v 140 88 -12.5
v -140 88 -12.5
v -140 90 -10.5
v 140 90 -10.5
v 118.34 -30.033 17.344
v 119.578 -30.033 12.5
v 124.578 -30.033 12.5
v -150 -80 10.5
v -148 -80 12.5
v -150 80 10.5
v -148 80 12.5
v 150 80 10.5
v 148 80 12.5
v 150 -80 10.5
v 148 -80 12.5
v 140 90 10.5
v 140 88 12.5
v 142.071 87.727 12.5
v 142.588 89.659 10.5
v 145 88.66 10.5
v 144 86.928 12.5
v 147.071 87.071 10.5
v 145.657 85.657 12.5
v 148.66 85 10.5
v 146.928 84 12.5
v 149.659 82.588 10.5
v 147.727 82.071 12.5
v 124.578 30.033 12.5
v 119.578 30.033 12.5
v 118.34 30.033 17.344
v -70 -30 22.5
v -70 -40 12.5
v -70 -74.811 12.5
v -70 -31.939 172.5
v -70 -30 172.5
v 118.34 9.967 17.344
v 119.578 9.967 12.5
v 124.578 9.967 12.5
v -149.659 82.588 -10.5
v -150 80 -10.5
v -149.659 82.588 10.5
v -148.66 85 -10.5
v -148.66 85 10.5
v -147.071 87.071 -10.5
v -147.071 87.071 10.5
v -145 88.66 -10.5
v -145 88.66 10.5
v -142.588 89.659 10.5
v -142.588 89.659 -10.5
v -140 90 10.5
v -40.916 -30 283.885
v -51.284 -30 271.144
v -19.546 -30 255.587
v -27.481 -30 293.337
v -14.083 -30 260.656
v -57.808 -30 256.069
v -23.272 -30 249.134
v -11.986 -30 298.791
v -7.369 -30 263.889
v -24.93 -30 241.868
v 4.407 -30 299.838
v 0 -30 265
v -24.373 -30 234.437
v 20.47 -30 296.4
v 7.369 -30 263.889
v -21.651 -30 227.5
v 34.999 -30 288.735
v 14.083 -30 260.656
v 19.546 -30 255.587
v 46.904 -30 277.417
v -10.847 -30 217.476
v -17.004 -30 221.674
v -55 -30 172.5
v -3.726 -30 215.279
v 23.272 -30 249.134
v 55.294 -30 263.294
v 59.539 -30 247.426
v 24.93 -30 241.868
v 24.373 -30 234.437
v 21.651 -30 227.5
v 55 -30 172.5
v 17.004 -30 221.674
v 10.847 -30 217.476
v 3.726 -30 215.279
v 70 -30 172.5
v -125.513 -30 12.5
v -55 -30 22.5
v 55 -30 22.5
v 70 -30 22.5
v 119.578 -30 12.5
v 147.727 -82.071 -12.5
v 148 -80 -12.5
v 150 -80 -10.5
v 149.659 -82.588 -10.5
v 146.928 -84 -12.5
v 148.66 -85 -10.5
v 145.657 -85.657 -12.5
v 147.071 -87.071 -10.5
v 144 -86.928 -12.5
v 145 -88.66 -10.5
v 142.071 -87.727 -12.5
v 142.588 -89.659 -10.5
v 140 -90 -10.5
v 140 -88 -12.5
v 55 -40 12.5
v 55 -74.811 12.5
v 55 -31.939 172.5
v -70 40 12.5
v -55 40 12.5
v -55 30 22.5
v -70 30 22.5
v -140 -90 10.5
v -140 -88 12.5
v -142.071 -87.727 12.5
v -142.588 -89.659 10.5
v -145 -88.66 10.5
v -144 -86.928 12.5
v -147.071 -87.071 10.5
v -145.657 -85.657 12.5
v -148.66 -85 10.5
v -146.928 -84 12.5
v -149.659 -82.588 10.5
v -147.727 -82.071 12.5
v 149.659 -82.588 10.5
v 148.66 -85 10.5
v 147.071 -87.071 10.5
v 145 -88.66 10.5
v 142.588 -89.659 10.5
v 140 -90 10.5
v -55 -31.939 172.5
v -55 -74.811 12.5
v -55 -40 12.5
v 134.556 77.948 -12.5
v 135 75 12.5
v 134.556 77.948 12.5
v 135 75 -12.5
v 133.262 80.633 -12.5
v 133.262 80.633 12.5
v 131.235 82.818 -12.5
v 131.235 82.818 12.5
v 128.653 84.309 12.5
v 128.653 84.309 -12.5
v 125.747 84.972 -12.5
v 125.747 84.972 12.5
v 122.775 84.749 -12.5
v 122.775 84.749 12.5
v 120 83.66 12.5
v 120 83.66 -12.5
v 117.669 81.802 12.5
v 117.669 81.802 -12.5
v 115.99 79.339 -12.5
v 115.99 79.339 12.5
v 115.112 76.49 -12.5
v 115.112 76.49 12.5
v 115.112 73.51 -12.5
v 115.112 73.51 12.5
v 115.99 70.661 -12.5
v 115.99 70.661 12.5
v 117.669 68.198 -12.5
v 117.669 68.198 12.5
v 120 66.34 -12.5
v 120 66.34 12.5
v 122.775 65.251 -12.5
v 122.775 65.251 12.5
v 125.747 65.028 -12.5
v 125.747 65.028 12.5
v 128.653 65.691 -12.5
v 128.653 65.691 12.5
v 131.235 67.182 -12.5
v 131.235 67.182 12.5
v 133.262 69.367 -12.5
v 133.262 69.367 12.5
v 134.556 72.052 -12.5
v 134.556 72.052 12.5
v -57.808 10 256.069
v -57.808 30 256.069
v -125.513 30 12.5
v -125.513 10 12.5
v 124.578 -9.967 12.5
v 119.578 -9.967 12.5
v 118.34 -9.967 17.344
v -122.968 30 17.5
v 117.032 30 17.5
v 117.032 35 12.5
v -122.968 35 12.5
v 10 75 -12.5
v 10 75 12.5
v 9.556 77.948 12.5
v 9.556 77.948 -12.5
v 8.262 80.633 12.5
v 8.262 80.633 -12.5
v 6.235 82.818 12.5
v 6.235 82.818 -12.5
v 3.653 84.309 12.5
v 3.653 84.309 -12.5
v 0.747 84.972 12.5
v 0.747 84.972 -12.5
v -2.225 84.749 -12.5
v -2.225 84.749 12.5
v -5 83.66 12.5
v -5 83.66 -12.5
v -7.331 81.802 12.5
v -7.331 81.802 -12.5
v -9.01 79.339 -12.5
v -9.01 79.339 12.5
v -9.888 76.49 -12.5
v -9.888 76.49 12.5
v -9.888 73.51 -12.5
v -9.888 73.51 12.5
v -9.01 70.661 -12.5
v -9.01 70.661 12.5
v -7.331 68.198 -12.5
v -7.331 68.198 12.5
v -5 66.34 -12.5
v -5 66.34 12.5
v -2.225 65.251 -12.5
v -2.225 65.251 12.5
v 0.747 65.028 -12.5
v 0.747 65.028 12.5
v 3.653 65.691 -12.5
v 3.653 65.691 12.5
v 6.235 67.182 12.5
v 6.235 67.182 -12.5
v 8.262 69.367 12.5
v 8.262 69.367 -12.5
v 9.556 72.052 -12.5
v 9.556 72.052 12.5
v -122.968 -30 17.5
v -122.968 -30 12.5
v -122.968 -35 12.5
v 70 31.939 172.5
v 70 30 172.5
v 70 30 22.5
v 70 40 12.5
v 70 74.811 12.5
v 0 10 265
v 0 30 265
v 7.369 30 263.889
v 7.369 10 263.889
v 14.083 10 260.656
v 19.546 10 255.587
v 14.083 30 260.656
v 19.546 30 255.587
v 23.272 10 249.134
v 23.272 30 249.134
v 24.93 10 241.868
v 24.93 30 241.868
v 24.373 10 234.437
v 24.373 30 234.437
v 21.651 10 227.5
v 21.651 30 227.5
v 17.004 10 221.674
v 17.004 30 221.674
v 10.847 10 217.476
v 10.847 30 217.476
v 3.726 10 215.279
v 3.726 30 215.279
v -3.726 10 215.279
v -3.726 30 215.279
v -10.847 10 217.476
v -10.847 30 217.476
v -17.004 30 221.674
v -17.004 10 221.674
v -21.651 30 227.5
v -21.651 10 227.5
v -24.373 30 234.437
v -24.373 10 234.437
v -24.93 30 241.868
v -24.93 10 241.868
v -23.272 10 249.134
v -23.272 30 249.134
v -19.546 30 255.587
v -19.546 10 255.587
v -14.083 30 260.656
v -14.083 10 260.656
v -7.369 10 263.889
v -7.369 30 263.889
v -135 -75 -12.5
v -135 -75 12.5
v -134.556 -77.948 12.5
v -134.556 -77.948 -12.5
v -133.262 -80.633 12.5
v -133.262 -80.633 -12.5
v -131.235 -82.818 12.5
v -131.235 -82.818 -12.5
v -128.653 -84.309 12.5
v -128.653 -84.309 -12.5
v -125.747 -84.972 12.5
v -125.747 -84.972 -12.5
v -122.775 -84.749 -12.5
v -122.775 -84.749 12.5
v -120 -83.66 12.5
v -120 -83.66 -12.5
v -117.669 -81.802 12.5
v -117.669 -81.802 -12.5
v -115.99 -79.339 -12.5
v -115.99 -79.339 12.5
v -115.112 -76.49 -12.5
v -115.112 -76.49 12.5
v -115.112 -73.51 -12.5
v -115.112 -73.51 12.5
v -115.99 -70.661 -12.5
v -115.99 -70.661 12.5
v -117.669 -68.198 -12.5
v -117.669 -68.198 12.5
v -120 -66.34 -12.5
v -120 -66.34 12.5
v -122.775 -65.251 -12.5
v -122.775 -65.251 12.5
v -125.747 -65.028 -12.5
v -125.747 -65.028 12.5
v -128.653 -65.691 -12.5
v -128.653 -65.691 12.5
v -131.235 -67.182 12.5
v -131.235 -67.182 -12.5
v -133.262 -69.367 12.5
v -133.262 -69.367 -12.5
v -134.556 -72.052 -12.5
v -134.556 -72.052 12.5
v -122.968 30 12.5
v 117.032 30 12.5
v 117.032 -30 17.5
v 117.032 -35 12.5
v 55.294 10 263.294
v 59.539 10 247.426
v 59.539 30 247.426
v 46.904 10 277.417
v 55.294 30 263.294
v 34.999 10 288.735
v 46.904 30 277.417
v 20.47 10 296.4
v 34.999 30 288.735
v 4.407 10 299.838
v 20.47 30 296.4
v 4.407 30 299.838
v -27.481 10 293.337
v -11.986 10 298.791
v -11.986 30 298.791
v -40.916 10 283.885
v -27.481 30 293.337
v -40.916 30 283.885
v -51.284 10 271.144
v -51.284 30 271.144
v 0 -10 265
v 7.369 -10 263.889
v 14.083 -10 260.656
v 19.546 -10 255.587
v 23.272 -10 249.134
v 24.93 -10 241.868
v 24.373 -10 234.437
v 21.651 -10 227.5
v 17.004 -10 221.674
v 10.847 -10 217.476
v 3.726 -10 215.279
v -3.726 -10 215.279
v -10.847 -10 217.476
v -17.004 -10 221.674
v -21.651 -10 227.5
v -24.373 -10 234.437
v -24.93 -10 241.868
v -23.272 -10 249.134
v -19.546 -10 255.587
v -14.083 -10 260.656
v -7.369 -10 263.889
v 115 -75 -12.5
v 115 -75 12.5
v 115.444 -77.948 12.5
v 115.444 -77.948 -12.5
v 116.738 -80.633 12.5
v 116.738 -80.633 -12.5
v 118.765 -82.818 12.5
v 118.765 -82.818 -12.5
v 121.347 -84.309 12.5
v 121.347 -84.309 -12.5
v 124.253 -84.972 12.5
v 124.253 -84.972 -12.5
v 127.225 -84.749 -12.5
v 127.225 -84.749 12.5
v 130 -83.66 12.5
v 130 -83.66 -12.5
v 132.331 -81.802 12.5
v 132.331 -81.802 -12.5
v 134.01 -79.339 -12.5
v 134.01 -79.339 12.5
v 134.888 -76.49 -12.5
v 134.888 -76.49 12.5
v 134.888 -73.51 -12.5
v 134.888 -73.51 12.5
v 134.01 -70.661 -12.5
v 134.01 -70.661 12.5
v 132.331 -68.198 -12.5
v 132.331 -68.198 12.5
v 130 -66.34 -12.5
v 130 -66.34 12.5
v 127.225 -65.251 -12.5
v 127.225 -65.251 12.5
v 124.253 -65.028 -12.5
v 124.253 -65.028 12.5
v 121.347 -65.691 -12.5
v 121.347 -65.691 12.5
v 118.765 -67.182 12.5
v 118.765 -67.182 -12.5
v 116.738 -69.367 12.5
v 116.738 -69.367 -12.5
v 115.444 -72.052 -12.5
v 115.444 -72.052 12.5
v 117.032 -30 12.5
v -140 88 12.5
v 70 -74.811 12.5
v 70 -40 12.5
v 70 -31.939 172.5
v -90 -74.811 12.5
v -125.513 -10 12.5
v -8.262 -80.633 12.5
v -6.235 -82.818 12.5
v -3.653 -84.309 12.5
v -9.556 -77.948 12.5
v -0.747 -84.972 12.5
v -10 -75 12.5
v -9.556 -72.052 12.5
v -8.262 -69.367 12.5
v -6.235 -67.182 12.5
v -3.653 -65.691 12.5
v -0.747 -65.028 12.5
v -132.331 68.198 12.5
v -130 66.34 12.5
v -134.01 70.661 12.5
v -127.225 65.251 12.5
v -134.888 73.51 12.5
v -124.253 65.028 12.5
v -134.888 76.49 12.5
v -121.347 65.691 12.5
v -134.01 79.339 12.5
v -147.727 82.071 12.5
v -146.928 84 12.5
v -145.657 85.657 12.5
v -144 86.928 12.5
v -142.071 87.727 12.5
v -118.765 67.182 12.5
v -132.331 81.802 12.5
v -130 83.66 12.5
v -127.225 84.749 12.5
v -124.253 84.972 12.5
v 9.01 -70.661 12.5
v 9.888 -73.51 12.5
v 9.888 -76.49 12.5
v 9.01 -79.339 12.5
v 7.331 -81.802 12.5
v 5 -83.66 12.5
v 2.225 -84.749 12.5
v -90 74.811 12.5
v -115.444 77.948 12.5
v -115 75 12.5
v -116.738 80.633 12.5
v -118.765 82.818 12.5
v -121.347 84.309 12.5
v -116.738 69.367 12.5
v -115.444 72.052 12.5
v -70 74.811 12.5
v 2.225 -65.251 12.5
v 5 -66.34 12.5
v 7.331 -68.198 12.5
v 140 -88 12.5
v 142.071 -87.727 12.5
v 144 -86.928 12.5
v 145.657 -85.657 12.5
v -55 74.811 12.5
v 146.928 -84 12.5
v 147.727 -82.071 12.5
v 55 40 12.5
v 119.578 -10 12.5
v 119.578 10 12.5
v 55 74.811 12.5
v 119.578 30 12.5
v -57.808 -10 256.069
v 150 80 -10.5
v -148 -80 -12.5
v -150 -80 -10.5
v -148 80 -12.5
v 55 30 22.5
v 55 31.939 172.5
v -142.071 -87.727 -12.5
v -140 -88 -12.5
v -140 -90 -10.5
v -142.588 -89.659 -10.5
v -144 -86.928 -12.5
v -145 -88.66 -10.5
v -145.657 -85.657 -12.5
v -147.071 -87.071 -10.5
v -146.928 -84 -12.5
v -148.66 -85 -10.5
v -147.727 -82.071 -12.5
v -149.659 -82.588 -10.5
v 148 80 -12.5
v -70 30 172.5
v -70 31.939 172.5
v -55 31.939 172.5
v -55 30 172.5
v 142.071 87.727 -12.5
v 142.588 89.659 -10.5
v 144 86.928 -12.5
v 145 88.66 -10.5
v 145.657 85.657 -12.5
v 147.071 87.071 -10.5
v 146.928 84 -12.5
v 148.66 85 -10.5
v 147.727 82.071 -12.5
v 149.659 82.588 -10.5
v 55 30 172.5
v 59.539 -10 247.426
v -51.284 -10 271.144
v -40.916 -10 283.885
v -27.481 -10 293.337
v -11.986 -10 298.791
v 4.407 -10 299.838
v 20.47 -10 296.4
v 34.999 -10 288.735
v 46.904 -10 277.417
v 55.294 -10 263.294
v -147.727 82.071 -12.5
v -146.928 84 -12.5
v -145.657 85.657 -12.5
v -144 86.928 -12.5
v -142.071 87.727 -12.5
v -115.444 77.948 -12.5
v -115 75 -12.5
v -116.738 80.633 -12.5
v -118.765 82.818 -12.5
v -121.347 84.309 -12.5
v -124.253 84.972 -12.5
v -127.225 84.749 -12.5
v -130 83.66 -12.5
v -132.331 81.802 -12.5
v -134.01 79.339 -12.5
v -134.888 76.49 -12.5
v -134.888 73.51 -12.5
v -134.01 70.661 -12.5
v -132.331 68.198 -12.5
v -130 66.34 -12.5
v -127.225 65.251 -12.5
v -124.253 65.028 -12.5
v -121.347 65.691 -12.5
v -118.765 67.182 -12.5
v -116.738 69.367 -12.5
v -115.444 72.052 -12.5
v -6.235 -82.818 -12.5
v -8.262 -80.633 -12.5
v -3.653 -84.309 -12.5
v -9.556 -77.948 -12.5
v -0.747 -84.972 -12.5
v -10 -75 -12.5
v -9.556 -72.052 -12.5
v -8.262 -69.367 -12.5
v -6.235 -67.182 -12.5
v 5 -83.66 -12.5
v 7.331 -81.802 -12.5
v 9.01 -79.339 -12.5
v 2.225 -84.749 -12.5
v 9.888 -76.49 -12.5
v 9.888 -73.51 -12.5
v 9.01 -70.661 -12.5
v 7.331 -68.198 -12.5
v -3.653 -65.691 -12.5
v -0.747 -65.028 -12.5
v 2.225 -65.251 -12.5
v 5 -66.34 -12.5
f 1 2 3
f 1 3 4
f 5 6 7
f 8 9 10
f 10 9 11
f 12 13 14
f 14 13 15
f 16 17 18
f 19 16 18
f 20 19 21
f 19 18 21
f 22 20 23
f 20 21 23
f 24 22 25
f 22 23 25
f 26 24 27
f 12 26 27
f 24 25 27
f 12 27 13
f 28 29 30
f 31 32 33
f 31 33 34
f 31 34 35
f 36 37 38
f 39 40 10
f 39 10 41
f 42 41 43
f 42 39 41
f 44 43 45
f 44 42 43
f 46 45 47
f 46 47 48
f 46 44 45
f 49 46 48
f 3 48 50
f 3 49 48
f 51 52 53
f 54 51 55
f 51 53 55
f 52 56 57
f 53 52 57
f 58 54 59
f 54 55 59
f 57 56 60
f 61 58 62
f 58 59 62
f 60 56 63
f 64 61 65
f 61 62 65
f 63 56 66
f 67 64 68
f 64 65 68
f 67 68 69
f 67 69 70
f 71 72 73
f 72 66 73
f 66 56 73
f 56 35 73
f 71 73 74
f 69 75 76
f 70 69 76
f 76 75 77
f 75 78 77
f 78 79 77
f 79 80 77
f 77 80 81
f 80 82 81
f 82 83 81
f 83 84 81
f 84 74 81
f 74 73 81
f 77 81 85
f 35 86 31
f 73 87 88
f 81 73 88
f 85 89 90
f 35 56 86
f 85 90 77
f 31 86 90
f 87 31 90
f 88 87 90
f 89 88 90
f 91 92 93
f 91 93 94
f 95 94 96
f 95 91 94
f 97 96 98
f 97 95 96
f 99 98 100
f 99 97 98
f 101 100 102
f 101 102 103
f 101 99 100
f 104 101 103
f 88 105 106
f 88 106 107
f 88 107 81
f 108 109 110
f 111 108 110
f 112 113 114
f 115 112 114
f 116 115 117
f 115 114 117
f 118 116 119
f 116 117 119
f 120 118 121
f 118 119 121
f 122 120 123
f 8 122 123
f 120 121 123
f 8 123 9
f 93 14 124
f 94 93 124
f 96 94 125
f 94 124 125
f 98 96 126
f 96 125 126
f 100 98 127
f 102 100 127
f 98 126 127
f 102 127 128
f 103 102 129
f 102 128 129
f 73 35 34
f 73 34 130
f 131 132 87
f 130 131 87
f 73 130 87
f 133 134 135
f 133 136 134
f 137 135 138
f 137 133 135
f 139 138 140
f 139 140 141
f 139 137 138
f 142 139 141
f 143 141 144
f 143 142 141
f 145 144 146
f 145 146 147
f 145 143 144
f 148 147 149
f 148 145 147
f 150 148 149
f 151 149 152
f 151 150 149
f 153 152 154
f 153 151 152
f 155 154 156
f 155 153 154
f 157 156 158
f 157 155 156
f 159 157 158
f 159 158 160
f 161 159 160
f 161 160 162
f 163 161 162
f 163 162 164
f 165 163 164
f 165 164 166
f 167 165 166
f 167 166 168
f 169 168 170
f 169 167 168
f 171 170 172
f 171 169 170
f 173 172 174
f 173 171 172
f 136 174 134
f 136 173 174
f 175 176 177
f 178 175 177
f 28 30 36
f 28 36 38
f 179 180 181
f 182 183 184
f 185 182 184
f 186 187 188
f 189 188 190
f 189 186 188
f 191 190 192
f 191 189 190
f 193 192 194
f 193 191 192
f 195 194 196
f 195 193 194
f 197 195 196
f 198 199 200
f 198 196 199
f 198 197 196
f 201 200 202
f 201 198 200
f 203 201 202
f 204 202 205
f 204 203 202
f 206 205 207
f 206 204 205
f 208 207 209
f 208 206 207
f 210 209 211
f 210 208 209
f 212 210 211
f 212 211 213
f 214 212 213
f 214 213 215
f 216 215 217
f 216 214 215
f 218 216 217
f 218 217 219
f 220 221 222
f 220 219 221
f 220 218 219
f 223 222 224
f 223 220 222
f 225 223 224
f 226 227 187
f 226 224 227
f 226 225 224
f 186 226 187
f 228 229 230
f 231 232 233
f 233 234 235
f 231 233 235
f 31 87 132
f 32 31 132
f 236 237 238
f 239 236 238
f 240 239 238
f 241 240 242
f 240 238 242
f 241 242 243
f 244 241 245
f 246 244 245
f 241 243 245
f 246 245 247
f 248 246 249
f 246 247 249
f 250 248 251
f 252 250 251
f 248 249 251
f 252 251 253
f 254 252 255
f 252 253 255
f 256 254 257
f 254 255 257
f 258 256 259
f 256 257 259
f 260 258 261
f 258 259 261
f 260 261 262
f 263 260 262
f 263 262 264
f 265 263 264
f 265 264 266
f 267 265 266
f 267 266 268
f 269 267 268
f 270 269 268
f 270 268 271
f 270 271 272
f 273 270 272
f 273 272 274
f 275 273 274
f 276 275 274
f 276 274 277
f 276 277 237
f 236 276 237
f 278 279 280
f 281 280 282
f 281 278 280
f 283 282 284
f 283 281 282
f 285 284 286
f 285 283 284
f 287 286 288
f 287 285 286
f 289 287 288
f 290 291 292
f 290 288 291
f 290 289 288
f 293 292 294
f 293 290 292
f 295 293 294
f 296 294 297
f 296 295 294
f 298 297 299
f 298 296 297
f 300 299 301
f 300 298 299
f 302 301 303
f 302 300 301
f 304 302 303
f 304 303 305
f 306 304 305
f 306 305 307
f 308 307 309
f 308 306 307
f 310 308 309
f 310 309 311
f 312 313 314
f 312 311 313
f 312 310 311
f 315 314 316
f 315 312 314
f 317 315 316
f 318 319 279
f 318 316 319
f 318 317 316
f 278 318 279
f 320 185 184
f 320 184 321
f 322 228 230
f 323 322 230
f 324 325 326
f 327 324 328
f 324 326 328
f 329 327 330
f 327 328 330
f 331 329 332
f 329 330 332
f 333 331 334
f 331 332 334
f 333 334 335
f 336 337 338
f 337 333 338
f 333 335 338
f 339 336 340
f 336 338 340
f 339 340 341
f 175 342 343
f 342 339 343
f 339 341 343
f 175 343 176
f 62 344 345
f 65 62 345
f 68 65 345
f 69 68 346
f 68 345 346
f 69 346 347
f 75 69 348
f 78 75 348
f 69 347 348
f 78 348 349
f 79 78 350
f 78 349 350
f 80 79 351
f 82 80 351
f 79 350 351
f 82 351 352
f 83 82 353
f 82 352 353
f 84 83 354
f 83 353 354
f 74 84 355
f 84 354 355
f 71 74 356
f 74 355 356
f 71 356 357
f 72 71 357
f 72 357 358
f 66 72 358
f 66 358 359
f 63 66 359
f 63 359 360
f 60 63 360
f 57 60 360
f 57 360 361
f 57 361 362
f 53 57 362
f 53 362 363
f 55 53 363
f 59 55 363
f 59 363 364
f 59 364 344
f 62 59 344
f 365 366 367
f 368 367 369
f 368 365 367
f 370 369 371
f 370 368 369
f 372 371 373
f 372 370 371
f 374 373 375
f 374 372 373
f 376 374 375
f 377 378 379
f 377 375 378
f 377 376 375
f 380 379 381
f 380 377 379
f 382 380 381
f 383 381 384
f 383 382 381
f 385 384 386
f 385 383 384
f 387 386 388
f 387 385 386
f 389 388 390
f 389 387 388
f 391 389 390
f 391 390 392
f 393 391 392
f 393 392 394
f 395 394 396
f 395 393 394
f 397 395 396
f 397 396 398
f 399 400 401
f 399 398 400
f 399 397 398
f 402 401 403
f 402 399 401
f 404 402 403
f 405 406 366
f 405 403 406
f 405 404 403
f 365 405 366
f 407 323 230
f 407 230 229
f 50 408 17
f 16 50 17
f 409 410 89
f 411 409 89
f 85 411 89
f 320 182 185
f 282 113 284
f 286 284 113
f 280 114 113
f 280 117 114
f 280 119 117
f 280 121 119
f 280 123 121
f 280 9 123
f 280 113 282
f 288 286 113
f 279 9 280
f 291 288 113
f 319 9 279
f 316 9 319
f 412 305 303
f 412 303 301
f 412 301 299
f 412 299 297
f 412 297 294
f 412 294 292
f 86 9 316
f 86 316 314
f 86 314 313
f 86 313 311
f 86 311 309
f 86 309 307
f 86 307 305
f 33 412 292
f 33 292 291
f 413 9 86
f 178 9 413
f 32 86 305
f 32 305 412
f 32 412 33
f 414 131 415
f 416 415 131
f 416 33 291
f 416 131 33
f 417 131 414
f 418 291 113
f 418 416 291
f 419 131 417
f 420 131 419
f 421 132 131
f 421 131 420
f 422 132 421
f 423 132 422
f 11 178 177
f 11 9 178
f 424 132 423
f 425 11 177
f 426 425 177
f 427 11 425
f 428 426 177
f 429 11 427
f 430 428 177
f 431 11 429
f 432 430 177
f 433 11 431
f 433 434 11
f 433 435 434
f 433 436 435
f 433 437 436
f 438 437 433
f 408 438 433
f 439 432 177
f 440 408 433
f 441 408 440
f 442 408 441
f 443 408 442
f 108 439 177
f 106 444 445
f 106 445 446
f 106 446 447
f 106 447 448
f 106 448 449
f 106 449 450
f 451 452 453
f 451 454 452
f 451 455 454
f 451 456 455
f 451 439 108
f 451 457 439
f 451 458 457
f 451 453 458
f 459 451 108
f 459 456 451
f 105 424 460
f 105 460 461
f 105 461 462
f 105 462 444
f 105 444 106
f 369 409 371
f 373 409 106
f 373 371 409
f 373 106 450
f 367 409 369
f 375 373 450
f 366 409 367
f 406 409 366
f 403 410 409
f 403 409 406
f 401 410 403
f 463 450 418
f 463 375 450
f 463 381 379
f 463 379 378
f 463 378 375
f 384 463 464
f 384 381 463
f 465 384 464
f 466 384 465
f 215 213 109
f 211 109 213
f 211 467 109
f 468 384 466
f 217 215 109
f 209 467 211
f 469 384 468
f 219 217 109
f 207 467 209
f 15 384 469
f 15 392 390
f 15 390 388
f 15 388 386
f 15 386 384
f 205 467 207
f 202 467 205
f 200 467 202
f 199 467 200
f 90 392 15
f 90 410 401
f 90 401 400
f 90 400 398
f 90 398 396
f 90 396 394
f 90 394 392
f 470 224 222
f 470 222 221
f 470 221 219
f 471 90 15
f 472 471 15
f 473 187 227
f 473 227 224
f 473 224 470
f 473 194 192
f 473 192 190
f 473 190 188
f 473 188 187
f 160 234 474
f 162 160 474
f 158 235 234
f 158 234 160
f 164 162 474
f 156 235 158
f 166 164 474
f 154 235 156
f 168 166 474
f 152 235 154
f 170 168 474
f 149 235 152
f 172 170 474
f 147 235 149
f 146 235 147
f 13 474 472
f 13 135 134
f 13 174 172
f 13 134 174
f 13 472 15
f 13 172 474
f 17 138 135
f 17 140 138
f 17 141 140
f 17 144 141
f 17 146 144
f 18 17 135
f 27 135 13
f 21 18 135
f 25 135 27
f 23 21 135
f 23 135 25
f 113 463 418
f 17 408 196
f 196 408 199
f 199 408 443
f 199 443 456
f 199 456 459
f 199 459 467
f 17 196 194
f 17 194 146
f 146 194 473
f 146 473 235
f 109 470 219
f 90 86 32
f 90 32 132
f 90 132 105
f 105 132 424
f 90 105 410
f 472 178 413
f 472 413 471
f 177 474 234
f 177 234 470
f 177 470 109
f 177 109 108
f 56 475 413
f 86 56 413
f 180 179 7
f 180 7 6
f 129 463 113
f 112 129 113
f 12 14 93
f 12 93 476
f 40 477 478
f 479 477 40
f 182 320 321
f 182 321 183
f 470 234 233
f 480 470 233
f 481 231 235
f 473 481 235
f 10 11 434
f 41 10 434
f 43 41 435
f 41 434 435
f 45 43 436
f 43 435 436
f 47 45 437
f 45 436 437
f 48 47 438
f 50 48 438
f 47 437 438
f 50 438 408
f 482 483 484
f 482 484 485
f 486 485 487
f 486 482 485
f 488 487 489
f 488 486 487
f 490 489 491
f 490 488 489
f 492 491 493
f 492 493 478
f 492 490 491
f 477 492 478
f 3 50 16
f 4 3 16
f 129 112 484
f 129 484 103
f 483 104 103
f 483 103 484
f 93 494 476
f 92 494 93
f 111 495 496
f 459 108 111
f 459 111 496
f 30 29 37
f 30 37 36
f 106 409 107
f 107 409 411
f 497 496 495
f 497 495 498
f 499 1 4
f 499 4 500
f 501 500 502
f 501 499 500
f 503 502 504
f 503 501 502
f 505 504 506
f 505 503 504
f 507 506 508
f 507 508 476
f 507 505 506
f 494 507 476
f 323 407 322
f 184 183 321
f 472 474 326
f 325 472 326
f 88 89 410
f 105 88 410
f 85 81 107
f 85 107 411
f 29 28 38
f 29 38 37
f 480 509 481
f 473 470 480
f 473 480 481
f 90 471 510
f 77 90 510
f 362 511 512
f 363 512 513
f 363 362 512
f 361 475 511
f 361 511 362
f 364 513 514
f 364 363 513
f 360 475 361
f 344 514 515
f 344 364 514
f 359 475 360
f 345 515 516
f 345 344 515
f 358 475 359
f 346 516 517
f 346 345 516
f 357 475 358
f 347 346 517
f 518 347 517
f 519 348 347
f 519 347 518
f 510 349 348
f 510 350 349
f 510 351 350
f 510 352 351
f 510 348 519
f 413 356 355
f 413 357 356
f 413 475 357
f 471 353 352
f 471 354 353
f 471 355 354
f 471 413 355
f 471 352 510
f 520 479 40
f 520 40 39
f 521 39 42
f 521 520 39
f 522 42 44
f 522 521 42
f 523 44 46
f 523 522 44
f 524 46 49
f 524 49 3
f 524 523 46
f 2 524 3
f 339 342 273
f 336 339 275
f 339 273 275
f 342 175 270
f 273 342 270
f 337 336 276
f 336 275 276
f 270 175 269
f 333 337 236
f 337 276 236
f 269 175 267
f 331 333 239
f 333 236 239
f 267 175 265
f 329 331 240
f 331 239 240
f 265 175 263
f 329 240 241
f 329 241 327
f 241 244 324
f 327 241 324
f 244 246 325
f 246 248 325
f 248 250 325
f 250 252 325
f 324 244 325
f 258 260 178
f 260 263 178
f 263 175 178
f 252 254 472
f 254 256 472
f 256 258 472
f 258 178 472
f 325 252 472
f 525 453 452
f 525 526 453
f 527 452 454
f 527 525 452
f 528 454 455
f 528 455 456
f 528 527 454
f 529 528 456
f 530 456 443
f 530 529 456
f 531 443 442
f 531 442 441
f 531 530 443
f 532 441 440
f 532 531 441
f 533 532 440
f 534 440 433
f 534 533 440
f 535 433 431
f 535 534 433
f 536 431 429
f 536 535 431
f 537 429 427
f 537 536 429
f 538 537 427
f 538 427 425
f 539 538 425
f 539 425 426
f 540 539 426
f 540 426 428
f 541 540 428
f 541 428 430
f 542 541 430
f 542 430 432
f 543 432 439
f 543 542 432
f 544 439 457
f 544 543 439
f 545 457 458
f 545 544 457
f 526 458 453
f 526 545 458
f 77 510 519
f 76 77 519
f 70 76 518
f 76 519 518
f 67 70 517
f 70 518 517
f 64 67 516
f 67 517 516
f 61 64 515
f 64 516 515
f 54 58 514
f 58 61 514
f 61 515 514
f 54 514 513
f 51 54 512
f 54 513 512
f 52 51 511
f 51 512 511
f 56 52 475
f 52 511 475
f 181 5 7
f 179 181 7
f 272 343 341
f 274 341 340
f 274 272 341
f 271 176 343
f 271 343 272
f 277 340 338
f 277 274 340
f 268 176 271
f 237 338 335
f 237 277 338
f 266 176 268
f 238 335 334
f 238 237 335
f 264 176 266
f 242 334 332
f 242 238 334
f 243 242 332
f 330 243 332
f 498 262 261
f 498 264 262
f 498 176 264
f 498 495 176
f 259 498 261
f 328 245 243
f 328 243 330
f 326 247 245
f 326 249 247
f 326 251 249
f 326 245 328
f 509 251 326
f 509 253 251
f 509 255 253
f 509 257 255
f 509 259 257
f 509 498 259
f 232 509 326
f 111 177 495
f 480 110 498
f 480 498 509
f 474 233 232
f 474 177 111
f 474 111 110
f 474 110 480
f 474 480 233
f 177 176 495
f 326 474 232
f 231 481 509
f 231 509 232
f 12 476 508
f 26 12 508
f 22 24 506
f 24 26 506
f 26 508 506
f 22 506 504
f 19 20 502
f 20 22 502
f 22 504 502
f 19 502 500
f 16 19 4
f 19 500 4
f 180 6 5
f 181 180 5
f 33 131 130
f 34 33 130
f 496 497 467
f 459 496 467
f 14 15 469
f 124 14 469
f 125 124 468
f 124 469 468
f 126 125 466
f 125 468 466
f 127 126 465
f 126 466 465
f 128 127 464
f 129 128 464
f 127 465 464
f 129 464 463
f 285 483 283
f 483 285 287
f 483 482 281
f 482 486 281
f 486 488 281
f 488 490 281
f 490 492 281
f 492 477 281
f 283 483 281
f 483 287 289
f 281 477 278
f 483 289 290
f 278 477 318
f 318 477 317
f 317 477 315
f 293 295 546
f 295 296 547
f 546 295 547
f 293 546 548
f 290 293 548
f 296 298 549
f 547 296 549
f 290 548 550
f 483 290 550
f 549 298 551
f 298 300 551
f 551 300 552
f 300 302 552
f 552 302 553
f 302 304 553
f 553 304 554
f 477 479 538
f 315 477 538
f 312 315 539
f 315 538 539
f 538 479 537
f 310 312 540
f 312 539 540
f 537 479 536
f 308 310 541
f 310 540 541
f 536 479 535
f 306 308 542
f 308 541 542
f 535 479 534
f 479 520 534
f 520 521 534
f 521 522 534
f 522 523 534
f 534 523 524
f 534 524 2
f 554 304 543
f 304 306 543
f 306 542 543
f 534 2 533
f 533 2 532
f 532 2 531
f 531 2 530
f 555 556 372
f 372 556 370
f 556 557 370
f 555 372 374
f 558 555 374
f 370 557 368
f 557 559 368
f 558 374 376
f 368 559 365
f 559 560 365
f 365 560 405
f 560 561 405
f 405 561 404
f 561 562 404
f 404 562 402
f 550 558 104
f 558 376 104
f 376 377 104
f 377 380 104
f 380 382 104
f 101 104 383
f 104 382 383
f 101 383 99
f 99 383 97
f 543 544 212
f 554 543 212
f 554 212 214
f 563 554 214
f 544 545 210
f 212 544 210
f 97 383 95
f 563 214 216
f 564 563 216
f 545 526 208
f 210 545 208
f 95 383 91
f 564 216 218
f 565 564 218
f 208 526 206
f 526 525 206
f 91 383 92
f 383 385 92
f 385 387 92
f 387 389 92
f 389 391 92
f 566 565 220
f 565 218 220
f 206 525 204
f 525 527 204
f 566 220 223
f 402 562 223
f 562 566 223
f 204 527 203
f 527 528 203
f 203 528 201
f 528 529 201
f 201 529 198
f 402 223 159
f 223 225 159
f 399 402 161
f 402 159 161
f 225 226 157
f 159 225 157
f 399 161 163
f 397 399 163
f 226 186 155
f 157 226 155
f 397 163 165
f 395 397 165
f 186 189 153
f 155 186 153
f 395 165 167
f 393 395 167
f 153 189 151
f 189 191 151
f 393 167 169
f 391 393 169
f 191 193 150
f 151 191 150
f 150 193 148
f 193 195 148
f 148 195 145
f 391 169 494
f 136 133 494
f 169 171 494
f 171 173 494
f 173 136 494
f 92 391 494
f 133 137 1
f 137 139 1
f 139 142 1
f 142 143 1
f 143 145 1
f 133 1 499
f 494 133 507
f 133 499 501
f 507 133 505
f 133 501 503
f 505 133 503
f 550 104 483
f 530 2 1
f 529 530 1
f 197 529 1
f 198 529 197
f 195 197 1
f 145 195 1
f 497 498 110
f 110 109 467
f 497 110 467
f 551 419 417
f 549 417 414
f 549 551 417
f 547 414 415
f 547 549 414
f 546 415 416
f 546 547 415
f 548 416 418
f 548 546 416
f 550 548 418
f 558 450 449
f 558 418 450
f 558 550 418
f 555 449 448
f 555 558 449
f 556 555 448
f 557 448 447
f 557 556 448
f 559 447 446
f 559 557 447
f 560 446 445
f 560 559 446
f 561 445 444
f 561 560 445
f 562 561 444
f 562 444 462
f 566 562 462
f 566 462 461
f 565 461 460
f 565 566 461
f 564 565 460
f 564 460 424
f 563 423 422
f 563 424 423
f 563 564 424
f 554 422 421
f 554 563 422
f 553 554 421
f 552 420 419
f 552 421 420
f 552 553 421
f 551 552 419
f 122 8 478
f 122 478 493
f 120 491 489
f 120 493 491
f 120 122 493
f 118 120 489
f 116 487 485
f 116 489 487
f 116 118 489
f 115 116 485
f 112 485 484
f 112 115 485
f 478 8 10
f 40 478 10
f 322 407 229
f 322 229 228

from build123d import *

# Parameters (mm, degrees)
SKETCH2_W           = 300
SKETCH2_H           = 180
SKETCH2_R           = 10
BOSS_EXTRUDE1_DEPTH = 12.5
FILLET1_R           = 10
CHAMFER3_SIZE       = 2
SKETCH3_W           = 245.602376855
SKETCH3_H           = 20
BOSS_EXTRUDE2_DEPTH = 290
SKETCH4_R           = 25
CUT_EXTRUDE2_DEPTH  = 290
SKETCH5_W           = 15
SKETCH5_H           = 44.810981007
BOSS_EXTRUDE3_DEPTH = 160
CUT_EXTRUDE4_DEPTH  = 160
CUT_EXTRUDE5_DEPTH  = 160
GUSSET4_START       = 9.967
GUSSET4_DEPTH       = 20.066
GUSSET5_START       = -30.033
GUSSET5_DEPTH       = 20.066
GUSSET6_THICKNESS   = 240
GUSSET7_THICKNESS   = 240


# Read off the part's stored shape, not the designer's step: Gusset4, Gusset5
with BuildPart() as part:
    # Sketch2 → Boss-Extrude1 (new, symmetric)
    with BuildSketch(Plane.XY):
        Rectangle(SKETCH2_W, SKETCH2_H)
        with Locations((125, 75)):
            Circle(SKETCH2_R, mode=Mode.SUBTRACT)
        with Locations((-125, 75)):
            Circle(SKETCH2_R, mode=Mode.SUBTRACT)
        with Locations((0, 75)):
            Circle(SKETCH2_R, mode=Mode.SUBTRACT)
        with Locations(Location((125, -75, 0), (0, 0, 180))):
            Circle(SKETCH2_R, mode=Mode.SUBTRACT)
        with Locations(Location((0, -75, 0), (0, 0, 180))):
            Circle(SKETCH2_R, mode=Mode.SUBTRACT)
        with Locations(Location((-125, -75, 0), (0, 0, 180))):
            Circle(SKETCH2_R, mode=Mode.SUBTRACT)
    extrude(amount=BOSS_EXTRUDE1_DEPTH, both=True)

    # Fillet1
    fillet1_edges = [part.edges().sort_by_distance(p)[0] for p in [
        (-150, 90, 0),
        (150, 90, 0),
        (150, -90, 0),
        (-150, -90, 0),
    ]]
    fillet(fillet1_edges, radius=FILLET1_R)

    # Chamfer3
    chamfer3_edges = [part.edges().sort_by_distance(p)[0] for p in [
        (-150, 0, -12.5),
        (-150, 0, 12.5),
        (0, 90, -12.5),
        (150, 0, -12.5),
        (0, -90, -12.5),
        (147.071067812, 87.071067812, -12.5),
        (147.071067812, -87.071067812, -12.5),
        (-147.071067812, -87.071067812, -12.5),
        (-147.071067812, 87.071067812, -12.5),
        (0, 90, 12.5),
        (0, -90, 12.5),
        (150, 0, 12.5),
        (147.071067812, 87.071067812, 12.5),
        (147.071067812, -87.071067812, 12.5),
        (-147.071067812, -87.071067812, 12.5),
        (-147.071067812, 87.071067812, 12.5),
    ]]
    chamfer(chamfer3_edges, length=CHAMFER3_SIZE)

    # Sketch3 → Boss-Extrude2 (add)
    with BuildSketch(Plane.XY.offset(12.5)):
        with Locations((-2.712098758, 20)):
            Rectangle(SKETCH3_W, SKETCH3_H)
        with Locations((-2.712098758, -20)):
            Rectangle(SKETCH3_W, SKETCH3_H)
    extrude(amount=BOSS_EXTRUDE2_DEPTH)

    # Sketch4 → Cut-Extrude2 (cut)
    with BuildSketch(Plane(origin=(0, 30, 0), x_dir=(1, 0, 0), z_dir=(0, 1, 0))):
        with Locations(Location((0, -240, 0), (0, 0, 270))):
            Circle(SKETCH4_R)
        with BuildLine():
            Line((120.08908967, -12.5), (119.577955686, -12.5))
            Line((119.577955686, -12.5), (59.538734687, -247.42556879))
            ThreePointArc((59.538734687, -247.42556879), (4.407482246, -299.837898528), (-57.808194698, -256.068995792))
            Line((-57.808194698, -256.068995792), (-125.513287185, -12.5))
            Line((-125.513287185, -12.5), (-125.513287185, -302.5))
            Line((-125.513287185, -302.5), (120.08908967, -302.5))
            Line((120.08908967, -302.5), (120.08908967, -12.5))
        make_face()
    extrude(amount=-CUT_EXTRUDE2_DEPTH, mode=Mode.SUBTRACT)

    # Sketch5 → Boss-Extrude3 (add)
    with BuildSketch(Plane.XY.offset(12.5)):
        with Locations((-62.5, 52.405490504)):
            Rectangle(SKETCH5_W, SKETCH5_H)
        with Locations((62.5, 52.405490504)):
            Rectangle(SKETCH5_W, SKETCH5_H)
        with Locations((-62.5, -52.405490504)):
            Rectangle(SKETCH5_W, SKETCH5_H)
        with Locations((62.5, -52.405490504)):
            Rectangle(SKETCH5_W, SKETCH5_H)
    extrude(amount=BOSS_EXTRUDE3_DEPTH)

    # Sketch6 → Cut-Extrude4 (cut)
    with BuildSketch(Plane(origin=(70, 0, 0), x_dir=(0, 0, -1), z_dir=(1, 0, 0))):
        Polygon((-172.5, 74.810981007), (-12.5, 74.810981007), (-172.5, 117.749424337), align=None)
        Polygon((-172.5, 74.810981007), (-172.5, 31.939110218), (-12.5, 74.810981007), align=None)
        Polygon((-12.5, -74.810981007), (-172.5, -31.939110218), (-172.5, -117.749424337), align=None)
    extrude(amount=-CUT_EXTRUDE4_DEPTH, mode=Mode.SUBTRACT)

    # Sketch8 → Cut-Extrude5 (cut)
    with BuildSketch(Plane(origin=(70, 0, 0), x_dir=(0, 0, -1), z_dir=(1, 0, 0))):
        Polygon((-12.5, 40), (-22.5, 30), (-12.5, 30), align=None)
        Polygon((-12.5, -40), (-12.5, -30), (-22.5, -30), align=None)
    extrude(amount=-CUT_EXTRUDE5_DEPTH, mode=Mode.SUBTRACT)


with BuildPart() as body_2:
    # Gusset4 outline → Gusset4 (new body)
    with BuildSketch(Plane(origin=(0, 0, 0), x_dir=(1, 0, 0), z_dir=(0, 1, 0)).offset(GUSSET4_START)):
        Polygon((118.339912342, -17.344300639), (124.577955686, -12.5), (119.577955686, -12.5), align=None)
    extrude(amount=GUSSET4_DEPTH)


with BuildPart() as body_3:
    # Gusset5 outline → Gusset5 (new body)
    with BuildSketch(Plane(origin=(0, 0, 0), x_dir=(1, 0, 0), z_dir=(0, 1, 0)).offset(GUSSET5_START)):
        Polygon((118.339912342, -17.344300639), (124.577955686, -12.5), (119.577955686, -12.5), align=None)
    extrude(amount=GUSSET5_DEPTH)


with BuildPart() as body_4:
    # Gusset6: a gusset: a plate 240.0 thick in the corner of two members, its outline drawn in place
    gusset6_outline = Wire([Line((-122.96766575, 30, 12.5), (-122.96766575, 30, 17.5)), Line((-122.96766575, 30, 17.5), (-122.96766575, 35, 12.5)), Line((-122.96766575, 35, 12.5), (-122.96766575, 30, 12.5))])
    add(extrude(Face(gusset6_outline), amount=GUSSET6_THICKNESS, dir=(1, 0, 0)))


with BuildPart() as body_5:
    # Gusset7: a gusset: a plate 240.0 thick in the corner of two members, its outline drawn in place
    gusset7_outline = Wire([Line((117.03233425, -30, 12.5), (117.03233425, -30, 17.5)), Line((117.03233425, -30, 17.5), (117.03233425, -35, 12.5)), Line((117.03233425, -35, 12.5), (117.03233425, -30, 12.5))])
    add(extrude(Face(gusset7_outline), amount=GUSSET7_THICKNESS, dir=(-1, 0, 0)))


solid = Compound([part.part, body_2.part, body_3.part, body_4.part, body_5.part])
